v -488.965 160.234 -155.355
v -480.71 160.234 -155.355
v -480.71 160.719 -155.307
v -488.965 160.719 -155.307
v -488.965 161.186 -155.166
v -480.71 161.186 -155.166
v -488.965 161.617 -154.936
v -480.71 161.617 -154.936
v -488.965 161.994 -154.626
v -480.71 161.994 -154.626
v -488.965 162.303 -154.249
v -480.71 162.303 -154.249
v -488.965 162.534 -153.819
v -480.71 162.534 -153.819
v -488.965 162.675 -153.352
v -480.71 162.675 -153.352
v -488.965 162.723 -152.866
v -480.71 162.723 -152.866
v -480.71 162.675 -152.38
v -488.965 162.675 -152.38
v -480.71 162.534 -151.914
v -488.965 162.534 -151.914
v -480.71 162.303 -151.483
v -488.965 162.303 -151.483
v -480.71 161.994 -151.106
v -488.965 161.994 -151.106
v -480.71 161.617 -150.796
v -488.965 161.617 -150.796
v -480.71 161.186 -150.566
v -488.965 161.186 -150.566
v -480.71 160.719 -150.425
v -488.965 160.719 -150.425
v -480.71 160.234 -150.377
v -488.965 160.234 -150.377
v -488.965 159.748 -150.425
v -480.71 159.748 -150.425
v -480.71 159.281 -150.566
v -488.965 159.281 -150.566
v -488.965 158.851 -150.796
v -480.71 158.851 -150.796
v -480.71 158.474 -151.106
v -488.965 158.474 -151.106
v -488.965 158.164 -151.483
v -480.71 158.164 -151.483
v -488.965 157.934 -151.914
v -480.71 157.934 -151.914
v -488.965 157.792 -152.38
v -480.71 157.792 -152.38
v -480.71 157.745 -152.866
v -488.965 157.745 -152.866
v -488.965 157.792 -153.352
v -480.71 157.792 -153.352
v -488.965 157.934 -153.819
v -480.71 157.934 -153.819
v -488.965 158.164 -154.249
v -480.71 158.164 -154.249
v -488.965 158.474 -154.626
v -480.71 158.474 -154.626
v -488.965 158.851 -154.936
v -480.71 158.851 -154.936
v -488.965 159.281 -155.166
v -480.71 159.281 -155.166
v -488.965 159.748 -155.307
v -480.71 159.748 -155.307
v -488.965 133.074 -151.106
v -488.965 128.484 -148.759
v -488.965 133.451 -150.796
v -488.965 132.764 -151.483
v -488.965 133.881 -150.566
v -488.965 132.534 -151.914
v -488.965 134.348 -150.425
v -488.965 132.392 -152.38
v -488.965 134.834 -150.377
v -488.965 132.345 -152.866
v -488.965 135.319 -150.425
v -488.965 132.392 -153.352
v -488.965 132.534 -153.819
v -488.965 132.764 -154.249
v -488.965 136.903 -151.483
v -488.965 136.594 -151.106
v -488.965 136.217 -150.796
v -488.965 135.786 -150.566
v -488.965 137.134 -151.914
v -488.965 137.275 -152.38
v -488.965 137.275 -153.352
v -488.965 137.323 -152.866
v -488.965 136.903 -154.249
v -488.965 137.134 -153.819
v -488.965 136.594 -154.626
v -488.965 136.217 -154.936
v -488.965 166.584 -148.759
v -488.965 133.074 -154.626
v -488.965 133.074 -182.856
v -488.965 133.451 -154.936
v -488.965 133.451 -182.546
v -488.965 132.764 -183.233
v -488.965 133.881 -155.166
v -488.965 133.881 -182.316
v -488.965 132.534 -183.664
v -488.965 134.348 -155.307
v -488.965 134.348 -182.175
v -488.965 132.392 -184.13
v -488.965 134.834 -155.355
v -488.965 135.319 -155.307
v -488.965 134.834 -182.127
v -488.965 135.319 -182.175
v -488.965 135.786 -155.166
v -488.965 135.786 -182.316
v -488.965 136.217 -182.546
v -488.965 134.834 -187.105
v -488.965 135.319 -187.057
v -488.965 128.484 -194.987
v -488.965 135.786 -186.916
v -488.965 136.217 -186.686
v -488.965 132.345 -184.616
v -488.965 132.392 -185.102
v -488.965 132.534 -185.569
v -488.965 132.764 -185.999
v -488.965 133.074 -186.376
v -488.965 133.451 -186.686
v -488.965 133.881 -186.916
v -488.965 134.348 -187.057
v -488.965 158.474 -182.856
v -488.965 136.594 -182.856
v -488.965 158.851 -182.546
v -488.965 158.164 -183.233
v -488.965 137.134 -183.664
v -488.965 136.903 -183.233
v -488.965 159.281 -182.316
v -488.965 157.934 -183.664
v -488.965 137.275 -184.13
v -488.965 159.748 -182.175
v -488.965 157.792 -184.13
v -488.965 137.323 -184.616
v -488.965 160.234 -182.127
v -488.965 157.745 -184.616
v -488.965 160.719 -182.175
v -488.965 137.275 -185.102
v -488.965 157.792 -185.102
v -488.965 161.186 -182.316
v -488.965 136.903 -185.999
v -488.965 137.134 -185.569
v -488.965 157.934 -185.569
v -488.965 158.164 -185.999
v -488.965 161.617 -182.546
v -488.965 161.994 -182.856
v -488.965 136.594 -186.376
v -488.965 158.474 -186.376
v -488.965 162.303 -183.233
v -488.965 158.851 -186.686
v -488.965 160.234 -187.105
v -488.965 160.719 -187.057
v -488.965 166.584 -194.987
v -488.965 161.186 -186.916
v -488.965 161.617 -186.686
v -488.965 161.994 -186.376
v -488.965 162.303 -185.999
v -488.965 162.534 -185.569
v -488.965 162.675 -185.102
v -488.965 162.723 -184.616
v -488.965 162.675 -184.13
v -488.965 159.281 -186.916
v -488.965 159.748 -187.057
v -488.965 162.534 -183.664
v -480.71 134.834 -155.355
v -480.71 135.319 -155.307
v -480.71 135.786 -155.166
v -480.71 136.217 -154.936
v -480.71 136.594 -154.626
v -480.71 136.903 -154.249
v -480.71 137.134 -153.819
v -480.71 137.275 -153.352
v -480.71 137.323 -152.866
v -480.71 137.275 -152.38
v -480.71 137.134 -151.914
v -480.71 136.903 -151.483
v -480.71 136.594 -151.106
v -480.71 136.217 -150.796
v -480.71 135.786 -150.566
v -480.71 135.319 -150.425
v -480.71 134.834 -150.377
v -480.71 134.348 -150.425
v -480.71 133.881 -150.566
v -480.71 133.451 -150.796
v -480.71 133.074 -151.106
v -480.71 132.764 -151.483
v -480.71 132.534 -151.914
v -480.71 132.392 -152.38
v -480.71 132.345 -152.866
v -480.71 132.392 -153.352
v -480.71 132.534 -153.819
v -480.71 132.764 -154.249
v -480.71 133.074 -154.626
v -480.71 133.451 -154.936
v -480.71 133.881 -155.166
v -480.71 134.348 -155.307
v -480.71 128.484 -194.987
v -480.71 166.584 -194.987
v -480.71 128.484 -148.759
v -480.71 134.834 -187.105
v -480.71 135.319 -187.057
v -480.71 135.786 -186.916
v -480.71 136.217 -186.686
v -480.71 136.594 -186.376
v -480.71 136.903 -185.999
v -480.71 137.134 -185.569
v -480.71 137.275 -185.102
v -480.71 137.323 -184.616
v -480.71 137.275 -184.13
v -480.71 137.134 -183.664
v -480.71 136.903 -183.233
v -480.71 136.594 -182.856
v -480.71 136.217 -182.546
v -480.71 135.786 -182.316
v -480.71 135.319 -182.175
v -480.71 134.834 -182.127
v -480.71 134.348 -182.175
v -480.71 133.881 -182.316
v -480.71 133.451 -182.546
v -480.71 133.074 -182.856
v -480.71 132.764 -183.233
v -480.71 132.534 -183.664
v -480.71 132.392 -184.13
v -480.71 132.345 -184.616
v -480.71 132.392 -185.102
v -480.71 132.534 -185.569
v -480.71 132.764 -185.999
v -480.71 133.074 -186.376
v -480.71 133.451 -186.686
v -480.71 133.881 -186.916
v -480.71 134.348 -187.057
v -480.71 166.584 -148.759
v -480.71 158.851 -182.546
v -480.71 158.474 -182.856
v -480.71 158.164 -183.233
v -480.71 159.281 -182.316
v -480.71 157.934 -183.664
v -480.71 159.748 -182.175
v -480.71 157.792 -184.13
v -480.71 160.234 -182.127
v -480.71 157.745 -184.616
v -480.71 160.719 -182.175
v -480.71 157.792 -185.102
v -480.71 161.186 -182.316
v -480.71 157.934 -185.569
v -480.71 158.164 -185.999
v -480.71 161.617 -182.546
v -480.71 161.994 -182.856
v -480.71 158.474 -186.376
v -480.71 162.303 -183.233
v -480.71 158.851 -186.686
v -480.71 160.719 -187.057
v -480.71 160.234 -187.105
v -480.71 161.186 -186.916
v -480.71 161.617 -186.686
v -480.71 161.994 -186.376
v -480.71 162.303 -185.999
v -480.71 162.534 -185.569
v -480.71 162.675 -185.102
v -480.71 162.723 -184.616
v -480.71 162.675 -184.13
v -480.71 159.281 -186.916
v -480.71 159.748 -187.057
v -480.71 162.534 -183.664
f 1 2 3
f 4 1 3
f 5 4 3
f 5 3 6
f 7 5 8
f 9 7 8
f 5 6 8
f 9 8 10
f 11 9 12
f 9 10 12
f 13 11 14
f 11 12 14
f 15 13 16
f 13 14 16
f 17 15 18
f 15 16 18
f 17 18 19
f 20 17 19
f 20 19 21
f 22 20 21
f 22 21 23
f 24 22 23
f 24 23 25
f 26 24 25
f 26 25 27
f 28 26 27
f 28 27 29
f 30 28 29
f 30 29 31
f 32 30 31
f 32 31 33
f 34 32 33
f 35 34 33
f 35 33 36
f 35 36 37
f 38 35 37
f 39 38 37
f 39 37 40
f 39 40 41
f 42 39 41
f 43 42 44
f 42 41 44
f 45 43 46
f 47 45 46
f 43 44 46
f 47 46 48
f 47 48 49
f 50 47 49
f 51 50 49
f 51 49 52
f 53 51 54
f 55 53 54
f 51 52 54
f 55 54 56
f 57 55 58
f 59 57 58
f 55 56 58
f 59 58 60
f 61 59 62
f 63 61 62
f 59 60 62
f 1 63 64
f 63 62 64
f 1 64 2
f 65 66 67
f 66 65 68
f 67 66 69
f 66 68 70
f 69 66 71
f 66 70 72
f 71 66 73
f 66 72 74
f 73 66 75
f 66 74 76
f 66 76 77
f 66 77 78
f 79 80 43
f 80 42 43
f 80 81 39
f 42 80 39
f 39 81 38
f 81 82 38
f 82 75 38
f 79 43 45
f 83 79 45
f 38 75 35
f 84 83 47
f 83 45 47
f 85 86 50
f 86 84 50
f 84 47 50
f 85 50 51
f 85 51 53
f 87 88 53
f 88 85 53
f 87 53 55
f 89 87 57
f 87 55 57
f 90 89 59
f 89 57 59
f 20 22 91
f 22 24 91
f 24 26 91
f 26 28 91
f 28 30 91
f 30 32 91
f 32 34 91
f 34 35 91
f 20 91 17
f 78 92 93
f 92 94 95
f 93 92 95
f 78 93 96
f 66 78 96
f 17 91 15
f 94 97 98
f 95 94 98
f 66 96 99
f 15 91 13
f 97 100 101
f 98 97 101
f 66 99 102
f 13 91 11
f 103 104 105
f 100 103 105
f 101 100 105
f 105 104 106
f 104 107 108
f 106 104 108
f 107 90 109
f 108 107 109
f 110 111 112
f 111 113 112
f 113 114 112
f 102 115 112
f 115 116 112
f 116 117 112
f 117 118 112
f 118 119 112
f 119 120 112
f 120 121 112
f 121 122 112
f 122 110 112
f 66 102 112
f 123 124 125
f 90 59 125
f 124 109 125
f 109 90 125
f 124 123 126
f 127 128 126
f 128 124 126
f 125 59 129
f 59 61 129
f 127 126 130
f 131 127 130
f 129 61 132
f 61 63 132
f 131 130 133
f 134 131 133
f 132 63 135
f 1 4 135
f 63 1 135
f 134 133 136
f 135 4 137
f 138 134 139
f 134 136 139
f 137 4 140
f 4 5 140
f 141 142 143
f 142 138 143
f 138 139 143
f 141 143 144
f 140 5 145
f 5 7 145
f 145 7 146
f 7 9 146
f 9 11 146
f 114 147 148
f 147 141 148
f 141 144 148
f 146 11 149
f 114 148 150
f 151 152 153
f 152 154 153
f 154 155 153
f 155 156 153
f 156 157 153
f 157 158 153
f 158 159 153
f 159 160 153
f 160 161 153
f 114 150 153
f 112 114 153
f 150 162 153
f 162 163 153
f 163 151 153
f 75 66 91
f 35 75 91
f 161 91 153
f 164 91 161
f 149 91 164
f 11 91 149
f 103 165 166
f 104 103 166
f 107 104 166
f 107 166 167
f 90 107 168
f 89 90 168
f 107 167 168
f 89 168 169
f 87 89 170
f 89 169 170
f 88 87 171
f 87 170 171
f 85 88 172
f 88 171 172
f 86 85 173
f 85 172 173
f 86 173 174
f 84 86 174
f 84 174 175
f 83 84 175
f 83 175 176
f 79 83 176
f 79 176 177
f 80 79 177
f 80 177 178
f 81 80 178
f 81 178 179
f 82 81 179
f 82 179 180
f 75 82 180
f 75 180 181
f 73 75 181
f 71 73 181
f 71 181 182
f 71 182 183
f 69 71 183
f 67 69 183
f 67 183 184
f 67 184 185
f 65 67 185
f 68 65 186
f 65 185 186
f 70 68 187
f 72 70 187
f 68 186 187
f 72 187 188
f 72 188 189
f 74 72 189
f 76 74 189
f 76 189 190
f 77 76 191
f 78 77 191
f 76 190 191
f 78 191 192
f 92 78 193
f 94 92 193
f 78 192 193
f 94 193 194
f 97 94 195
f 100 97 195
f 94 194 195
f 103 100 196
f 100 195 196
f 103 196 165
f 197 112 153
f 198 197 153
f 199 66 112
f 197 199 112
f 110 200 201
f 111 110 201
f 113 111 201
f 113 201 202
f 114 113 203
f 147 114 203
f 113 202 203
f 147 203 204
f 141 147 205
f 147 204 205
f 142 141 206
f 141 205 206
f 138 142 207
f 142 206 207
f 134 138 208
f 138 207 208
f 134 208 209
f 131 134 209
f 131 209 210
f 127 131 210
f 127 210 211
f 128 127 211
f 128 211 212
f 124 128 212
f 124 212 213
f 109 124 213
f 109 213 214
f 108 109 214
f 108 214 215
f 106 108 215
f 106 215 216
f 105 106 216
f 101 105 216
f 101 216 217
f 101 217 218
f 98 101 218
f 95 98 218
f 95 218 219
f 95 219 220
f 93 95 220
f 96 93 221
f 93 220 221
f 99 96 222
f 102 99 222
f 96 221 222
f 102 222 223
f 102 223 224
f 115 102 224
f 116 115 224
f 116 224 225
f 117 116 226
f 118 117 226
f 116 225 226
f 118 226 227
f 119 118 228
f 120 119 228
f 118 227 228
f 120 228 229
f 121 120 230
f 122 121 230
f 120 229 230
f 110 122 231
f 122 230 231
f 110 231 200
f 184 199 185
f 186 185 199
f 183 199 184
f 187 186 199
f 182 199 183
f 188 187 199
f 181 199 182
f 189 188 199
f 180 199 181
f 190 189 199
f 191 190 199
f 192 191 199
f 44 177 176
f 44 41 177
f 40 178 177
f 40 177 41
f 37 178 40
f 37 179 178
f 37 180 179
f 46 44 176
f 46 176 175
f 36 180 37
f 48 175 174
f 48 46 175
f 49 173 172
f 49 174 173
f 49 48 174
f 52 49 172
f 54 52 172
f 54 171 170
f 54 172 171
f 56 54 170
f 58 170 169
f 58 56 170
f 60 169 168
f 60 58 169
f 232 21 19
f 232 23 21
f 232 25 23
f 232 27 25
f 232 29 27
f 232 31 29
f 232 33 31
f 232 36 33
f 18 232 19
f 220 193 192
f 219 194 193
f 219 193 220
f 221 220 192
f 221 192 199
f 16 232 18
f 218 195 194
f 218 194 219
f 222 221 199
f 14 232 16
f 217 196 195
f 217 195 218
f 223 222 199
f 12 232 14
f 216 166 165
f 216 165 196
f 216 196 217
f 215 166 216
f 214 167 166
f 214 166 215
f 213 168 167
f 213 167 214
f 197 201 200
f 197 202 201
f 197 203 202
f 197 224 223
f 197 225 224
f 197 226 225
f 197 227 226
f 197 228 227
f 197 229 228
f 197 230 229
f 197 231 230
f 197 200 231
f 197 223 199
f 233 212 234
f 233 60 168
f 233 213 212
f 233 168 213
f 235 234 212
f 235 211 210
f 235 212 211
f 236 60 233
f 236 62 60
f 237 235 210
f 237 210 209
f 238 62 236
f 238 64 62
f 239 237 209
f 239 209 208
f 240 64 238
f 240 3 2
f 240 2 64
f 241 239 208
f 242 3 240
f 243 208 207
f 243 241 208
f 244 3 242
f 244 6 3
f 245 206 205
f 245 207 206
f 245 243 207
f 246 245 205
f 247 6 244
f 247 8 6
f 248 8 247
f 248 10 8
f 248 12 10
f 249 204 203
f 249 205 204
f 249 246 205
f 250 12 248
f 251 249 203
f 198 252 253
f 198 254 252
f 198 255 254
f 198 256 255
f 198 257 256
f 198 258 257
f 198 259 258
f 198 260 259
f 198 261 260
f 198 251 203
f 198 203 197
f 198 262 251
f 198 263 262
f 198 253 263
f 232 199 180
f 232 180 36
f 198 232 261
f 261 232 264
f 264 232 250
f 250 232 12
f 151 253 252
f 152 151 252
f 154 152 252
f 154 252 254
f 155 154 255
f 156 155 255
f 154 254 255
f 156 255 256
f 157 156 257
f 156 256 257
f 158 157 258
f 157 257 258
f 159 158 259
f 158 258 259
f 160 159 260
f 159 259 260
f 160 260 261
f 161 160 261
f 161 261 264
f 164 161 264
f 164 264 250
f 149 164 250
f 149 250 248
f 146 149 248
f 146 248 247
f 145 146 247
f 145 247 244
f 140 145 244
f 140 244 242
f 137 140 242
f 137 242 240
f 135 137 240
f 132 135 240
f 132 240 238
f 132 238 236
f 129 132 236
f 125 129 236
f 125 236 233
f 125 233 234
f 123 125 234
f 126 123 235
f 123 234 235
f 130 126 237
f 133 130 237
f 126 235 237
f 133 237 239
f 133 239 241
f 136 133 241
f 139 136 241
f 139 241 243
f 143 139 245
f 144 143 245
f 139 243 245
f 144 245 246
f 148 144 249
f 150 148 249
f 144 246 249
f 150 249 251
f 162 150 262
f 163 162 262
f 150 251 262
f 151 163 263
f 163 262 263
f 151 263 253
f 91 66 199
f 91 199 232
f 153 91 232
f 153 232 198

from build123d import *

# Parameters (mm, degrees)
SKETCH2_W                  = 46.228
SKETCH2_H                  = 38.1
BOSS_EXTRUDE1_DEPTH        = 8.255
F_10_CLEARANCE_HOLE1_D     = 4.9784
F_10_CLEARANCE_HOLE1_DEPTH = 25.4
F_10_CLEARANCE_HOLE1_TIP   = 1.495662253


with BuildPart() as part:
    # Sketch2 → Boss-Extrude1 (new body)
    with BuildSketch(Plane(origin=(-488.965433296, 0, 0), x_dir=(0, 0, -1), z_dir=(1, 0, 0))):
        with Locations((171.873330939, 147.533779805)):
            Rectangle(SKETCH2_W, SKETCH2_H)
    extrude(amount=BOSS_EXTRUDE1_DEPTH)

    # #10 Clearance Hole1
    with Locations(Plane.ZY.offset(488.965433296)):
        with Locations((-184.616110941, 160.233779805), (-152.866110941, 160.233779805), (-152.866110941, 134.833779805), (-184.616110941, 134.833779805)):
            Hole(F_10_CLEARANCE_HOLE1_D / 2, depth=F_10_CLEARANCE_HOLE1_DEPTH)
            with Locations((0, 0, -(F_10_CLEARANCE_HOLE1_DEPTH + F_10_CLEARANCE_HOLE1_TIP / 2))):  # 118° drill point
                Cone(0, F_10_CLEARANCE_HOLE1_D / 2, F_10_CLEARANCE_HOLE1_TIP, mode=Mode.SUBTRACT)


solid = part.part
